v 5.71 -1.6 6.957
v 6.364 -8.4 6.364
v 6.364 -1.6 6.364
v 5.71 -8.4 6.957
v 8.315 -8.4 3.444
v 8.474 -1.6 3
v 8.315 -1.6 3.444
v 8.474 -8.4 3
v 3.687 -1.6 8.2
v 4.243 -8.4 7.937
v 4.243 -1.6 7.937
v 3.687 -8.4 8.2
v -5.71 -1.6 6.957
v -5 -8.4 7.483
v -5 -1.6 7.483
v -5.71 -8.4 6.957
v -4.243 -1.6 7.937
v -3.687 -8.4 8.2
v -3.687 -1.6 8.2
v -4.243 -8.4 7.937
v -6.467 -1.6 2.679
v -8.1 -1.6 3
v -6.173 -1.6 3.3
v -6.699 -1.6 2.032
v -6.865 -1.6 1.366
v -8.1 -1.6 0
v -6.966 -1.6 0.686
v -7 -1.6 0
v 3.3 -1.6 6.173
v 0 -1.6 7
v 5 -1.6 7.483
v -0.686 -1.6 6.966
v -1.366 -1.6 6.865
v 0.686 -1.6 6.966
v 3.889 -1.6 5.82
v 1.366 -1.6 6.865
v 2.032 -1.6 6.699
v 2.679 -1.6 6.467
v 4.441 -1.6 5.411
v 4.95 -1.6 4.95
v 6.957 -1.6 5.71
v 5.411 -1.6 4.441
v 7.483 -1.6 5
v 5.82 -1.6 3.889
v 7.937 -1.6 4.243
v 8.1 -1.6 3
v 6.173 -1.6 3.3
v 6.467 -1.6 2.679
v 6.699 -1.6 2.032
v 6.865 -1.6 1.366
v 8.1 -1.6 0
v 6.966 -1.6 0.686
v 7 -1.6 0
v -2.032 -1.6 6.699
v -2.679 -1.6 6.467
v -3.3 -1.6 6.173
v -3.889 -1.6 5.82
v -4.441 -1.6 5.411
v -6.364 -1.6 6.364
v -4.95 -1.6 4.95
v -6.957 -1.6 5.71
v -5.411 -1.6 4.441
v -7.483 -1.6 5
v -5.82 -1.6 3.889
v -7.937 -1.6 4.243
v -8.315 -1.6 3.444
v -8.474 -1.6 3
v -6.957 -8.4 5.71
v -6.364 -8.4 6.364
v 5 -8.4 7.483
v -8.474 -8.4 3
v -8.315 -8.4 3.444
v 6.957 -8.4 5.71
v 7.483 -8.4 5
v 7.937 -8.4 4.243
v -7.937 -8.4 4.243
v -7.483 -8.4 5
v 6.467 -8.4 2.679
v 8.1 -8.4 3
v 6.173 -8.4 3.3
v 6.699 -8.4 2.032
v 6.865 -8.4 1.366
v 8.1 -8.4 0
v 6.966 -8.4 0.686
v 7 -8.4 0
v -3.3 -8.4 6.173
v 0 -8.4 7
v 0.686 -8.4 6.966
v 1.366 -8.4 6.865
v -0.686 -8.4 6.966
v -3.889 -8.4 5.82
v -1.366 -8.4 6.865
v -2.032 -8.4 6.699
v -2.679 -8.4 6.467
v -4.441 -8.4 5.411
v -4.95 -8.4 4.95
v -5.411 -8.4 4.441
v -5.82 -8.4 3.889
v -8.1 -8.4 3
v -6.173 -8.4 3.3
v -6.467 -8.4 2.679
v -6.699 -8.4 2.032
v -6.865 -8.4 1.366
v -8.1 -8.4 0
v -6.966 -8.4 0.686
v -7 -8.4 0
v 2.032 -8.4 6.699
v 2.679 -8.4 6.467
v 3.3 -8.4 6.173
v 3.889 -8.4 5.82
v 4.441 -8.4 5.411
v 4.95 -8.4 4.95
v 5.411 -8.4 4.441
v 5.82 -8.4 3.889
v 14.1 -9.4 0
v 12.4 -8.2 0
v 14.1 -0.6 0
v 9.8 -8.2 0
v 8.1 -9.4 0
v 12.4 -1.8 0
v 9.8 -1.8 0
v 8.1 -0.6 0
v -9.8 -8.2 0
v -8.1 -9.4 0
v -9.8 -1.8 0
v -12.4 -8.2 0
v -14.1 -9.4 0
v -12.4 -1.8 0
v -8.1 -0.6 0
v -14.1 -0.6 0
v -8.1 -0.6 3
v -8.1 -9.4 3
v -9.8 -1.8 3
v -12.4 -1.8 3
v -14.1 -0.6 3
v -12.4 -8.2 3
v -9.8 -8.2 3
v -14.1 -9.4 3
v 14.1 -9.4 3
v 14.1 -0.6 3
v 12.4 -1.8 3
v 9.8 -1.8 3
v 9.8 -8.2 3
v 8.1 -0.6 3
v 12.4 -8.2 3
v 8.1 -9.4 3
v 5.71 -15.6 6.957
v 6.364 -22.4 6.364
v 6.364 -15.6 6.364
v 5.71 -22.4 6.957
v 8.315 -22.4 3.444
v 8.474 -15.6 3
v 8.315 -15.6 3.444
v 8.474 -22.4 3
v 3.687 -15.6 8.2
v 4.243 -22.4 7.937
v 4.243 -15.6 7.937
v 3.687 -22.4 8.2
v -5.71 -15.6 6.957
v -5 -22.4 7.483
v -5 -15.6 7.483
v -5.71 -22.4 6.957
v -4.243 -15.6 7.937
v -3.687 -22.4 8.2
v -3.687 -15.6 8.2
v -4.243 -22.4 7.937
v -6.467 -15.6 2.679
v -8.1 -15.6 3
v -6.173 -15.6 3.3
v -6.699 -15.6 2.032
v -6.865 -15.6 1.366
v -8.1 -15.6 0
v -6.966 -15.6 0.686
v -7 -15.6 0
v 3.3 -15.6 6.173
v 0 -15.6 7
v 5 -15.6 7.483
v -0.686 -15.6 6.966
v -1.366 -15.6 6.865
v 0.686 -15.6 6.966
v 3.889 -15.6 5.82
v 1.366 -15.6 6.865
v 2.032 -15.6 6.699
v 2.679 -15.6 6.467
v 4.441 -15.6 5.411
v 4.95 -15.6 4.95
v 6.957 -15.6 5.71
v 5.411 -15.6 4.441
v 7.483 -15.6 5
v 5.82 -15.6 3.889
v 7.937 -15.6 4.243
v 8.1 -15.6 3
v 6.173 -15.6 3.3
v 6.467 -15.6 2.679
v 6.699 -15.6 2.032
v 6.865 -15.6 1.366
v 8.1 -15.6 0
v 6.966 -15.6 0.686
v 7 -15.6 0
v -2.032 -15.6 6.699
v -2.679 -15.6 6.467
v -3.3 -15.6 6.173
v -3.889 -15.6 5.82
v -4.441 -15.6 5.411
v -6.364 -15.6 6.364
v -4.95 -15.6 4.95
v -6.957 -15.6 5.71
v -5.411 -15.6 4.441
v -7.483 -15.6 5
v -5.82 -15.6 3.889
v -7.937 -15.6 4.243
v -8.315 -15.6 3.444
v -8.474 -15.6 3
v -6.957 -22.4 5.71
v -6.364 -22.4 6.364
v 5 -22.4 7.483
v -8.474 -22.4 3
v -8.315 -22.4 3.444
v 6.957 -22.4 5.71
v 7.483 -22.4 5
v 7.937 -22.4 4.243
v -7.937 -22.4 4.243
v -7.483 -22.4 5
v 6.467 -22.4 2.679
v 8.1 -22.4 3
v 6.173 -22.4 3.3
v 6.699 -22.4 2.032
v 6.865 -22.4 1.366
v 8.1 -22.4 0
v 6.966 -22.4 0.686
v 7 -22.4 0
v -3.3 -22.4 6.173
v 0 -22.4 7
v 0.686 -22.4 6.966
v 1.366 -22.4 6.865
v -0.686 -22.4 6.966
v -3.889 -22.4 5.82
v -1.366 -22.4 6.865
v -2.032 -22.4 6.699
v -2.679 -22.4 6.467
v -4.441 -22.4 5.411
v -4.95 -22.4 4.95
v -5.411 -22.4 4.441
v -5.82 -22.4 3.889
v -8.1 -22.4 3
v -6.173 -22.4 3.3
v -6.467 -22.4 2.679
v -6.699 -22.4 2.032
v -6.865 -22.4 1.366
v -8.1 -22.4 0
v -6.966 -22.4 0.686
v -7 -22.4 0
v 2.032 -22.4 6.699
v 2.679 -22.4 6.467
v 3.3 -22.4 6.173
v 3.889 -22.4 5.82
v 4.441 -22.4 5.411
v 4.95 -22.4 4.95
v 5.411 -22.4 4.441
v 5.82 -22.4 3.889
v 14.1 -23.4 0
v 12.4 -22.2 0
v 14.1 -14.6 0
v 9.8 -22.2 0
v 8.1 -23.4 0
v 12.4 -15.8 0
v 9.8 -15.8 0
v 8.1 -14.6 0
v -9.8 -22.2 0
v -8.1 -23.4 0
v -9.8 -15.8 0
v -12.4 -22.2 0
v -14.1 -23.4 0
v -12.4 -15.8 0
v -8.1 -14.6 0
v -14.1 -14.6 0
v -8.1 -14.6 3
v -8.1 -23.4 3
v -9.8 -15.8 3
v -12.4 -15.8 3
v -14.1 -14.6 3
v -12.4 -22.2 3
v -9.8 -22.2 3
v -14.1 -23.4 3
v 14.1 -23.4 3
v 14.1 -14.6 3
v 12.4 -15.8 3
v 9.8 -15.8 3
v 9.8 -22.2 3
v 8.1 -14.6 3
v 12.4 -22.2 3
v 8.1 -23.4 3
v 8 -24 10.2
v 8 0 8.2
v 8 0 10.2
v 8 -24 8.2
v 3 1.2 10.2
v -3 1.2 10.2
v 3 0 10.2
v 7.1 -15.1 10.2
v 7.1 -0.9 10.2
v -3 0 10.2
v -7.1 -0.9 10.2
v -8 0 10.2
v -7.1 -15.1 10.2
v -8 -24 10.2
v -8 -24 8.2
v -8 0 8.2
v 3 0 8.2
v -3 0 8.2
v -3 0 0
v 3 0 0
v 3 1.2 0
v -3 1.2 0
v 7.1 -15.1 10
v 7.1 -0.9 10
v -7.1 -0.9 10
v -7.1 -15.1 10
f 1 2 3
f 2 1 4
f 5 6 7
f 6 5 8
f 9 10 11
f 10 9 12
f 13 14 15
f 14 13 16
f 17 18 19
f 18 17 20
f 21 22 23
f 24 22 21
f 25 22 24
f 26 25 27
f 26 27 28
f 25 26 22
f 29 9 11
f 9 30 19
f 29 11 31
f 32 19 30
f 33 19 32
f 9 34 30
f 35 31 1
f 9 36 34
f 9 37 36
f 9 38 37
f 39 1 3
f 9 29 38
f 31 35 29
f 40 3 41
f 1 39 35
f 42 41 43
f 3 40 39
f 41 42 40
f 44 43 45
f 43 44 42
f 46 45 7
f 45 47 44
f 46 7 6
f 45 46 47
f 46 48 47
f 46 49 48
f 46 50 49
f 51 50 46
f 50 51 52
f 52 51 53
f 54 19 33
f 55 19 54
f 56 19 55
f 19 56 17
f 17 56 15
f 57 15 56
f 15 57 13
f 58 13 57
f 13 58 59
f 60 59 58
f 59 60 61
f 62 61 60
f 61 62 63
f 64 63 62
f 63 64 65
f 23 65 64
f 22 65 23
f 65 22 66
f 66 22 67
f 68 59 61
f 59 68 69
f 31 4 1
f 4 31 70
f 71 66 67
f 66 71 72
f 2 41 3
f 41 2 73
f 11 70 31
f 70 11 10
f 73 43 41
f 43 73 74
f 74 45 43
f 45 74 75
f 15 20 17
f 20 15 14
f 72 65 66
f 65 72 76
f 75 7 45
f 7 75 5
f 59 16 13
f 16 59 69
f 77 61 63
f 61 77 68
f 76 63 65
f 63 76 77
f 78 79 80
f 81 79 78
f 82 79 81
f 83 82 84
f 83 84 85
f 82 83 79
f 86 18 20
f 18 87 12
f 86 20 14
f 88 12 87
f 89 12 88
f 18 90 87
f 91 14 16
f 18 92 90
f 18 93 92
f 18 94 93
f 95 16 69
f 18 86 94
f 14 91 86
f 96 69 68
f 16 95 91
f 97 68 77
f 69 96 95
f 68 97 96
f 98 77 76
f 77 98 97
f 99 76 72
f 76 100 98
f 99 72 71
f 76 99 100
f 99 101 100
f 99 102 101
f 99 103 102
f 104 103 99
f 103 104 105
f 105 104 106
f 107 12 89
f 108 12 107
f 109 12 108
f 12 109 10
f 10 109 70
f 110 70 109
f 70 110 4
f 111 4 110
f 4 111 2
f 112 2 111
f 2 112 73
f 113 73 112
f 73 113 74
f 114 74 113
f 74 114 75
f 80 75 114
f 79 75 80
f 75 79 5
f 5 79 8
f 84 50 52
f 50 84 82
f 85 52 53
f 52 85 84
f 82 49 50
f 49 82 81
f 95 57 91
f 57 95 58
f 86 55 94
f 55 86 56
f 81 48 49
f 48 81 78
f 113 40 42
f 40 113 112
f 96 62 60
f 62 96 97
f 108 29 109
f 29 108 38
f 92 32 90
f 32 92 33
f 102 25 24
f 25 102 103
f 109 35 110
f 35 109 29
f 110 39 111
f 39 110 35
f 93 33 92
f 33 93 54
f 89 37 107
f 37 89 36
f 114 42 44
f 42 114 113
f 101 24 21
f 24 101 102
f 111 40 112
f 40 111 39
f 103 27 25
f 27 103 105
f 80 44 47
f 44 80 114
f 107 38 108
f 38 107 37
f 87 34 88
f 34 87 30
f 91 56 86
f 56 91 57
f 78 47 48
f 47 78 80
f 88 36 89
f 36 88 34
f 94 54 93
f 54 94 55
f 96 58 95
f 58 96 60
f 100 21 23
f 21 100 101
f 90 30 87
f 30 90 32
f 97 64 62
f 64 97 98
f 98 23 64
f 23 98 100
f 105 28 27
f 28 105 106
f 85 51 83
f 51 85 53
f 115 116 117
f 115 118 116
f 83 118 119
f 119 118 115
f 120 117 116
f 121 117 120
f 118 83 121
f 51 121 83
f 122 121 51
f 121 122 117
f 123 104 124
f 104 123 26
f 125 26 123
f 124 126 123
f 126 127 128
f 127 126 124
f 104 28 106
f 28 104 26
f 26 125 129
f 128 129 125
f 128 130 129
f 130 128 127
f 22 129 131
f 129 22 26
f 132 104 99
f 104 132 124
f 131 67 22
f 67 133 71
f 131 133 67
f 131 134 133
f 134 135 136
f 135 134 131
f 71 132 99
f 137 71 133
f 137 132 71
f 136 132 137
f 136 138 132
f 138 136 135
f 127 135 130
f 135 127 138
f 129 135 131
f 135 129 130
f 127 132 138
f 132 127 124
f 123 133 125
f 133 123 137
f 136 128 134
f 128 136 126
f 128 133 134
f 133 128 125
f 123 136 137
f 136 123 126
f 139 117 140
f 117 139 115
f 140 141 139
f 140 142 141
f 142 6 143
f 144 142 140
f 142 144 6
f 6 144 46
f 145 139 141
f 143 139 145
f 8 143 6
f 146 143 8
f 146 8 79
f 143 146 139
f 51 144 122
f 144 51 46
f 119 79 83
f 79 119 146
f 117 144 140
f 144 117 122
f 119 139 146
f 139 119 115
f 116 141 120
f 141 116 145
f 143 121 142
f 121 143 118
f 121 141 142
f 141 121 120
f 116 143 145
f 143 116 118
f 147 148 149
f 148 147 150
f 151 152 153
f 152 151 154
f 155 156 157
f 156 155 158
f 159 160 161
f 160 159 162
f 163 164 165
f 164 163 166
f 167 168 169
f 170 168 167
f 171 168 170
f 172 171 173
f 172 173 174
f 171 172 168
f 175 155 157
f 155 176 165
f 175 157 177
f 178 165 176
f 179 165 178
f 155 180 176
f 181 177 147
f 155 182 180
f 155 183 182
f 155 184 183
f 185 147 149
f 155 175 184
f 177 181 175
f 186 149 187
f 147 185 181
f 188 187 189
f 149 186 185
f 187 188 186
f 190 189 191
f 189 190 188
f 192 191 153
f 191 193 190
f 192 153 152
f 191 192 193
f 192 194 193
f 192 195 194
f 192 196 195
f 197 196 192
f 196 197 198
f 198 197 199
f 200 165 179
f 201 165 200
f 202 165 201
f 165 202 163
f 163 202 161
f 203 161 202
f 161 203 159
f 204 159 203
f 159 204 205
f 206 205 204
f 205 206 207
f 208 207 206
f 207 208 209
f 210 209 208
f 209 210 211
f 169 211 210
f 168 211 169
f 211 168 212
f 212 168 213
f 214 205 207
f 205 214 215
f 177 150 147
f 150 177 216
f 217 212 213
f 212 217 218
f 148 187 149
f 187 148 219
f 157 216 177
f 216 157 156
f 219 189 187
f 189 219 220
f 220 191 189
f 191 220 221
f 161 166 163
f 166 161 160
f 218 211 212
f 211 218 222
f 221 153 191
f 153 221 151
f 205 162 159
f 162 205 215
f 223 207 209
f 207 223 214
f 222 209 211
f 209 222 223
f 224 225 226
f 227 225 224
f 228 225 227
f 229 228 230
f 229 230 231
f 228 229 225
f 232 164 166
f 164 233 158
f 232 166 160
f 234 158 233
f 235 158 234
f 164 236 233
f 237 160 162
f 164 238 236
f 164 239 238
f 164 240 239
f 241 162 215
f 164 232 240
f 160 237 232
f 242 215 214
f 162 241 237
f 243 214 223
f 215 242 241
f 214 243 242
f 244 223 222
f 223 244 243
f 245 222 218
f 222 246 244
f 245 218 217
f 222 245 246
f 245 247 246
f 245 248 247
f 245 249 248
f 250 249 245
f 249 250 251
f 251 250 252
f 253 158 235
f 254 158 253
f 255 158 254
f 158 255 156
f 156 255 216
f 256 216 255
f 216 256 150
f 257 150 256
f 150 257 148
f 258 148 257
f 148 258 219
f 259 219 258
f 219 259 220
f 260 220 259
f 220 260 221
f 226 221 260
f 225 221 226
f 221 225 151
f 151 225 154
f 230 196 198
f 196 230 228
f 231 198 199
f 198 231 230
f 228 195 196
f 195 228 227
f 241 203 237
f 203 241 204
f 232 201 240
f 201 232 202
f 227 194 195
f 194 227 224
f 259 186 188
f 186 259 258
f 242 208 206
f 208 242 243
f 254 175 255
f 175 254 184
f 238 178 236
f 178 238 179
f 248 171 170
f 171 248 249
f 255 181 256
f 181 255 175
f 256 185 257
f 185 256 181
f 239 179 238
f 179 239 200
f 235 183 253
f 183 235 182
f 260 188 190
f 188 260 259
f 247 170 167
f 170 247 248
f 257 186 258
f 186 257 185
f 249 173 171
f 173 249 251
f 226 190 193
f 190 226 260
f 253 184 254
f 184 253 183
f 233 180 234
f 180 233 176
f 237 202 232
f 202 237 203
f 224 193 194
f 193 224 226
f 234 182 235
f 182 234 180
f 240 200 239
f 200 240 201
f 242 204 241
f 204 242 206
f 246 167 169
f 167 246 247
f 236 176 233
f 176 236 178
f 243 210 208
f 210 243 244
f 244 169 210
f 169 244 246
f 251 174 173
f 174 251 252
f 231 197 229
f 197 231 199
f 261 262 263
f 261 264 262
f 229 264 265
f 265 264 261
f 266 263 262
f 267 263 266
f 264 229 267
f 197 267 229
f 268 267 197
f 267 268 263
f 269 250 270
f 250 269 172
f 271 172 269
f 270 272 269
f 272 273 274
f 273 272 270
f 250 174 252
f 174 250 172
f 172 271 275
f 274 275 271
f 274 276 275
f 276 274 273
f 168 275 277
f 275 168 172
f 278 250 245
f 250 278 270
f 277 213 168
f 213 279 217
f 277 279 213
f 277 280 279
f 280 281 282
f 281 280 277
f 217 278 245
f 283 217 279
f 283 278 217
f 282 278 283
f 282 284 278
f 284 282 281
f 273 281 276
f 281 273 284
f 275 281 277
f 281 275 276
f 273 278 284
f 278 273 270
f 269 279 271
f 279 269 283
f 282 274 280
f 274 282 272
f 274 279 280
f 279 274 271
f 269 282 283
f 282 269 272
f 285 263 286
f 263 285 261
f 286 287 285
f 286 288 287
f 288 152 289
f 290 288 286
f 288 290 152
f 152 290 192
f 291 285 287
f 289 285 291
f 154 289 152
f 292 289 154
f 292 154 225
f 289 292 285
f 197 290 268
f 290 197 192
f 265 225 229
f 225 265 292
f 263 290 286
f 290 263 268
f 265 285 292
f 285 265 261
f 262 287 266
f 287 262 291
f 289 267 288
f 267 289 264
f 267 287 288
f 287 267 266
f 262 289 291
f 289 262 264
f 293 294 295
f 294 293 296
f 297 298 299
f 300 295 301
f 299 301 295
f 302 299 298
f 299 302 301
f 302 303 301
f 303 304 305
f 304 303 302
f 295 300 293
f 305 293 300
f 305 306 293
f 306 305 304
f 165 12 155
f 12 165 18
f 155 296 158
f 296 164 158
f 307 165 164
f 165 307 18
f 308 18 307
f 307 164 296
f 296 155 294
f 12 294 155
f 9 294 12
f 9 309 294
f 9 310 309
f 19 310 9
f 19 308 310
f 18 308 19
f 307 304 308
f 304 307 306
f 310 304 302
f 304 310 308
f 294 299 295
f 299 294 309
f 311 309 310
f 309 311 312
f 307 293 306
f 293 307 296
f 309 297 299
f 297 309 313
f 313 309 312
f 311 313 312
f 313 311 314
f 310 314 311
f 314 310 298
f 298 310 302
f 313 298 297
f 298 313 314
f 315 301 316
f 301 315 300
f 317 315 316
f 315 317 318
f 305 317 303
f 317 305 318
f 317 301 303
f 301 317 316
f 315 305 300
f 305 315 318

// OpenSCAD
// ReachSense six-finger wrap v1. Units: mm. Experimental, physically unverified.
// R: +X lateral, +Y distal (towards fingertip), +Z dorsal.
// The marker deck's distal edge and the stop's inner contact face are both Y=0.
// The outer stop is Y=1.2; it is NOT the anatomical reference.
// The stop constrains Y only. Anatomical X/Z and placement repeatability are unverified.
$fn = 64;
part = "holder"; // "holder" or "strap"
marker_id = 23;
finger_diameter_mm = 14;
marker_edge_mm = 10;
quiet_zone_mm = 2;
frame_mm = 1;
wall_mm = 2;
stop_wall_mm = 1.2;
strap_width_mm = 6;
strap_length_mm = 90;

r = finger_diameter_mm/2;
tile = marker_edge_mm + 2*quiet_zone_mm;
deck_width = tile + 2*frame_mm;
length = tile + 2*frame_mm + 8;
deck_bottom = r + wall_mm - 0.8;
deck_top = deck_bottom + 2;
pocket_depth = 0.2;
marker_y = -(frame_mm + quiet_zone_mm + marker_edge_mm/2);
support_y = [-5, -length+5];

assert(finger_diameter_mm >= 12 && finger_diameter_mm <= 26, "Choose a 12–26 mm candidate opening");
assert(marker_edge_mm >= 8 && marker_edge_mm <= 16, "Choose an 8–16 mm black edge");
assert(quiet_zone_mm >= 2, "Keep the full white quiet zone");
assert(marker_id >= 0 && marker_id < 100, "DICT_4X4_100 ID required");

module support(y) {
    translate([0,y,0]) intersection() {
        difference() {
            rotate([90,0,0]) cylinder(r=r+wall_mm,h=6.8,center=true);
            rotate([90,0,0]) cylinder(r=r,h=8.8,center=true);
        }
        translate([-r-wall_mm-1,-4.4,0]) cube([2*(r+wall_mm+1),8.8,r+wall_mm+1]);
    }
    // Through-slots for 6 mm hook-and-loop strap or the optional TPU strip.
    for(sign=[-1,1]) translate([sign*(r+wall_mm+2.1),y,1.5]) difference() {
        cube([6,8.8,3],center=true);
        cube([2.6,6.4,5],center=true);
    }
}

module holder() {
    difference() {
        union() {
            for(y=support_y) support(y);
            translate([-deck_width/2,-length,deck_bottom]) cube([deck_width,length,2]);
            // Front stop contacts the fingertip at its INNER face Y=0.
            // Deck ends at Y=0 while this wall extends beyond it, preserving the reference.
            translate([-3,0,0]) cube([6,stop_wall_mm,deck_top]);
        }
        // Shallow square registration recess. Keep all 2 mm white margins visible.
        translate([-tile/2-0.1,marker_y-tile/2-0.1,deck_top-pocket_depth])
            cube([tile+0.2,tile+0.2,pocket_depth+1]);
        // Identity comes from the attached printed marker. Geometry is shared by size.
    }
}

module strap() {
    // TPU-only ladder strip. Its ends need a return loop/fastener or hook-and-loop tape.
    // This is not an articulated hard-plastic chain or a validated locking buckle.
    union() {
        translate([-strap_length_mm/2,-strap_width_mm/2,0])
            cube([strap_length_mm,strap_width_mm,0.8]);
        for(x=[-strap_length_mm/2+3:4:strap_length_mm/2-3])
            translate([x-0.7,-strap_width_mm/2,0.8]) cube([1.4,strap_width_mm,0.5]);
    }
}

if(part == "strap") strap(); else holder();
echo(reference_plane_y_mm=0, outer_stop_y_mm=stop_wall_mm);
echo(marker_center_R_mm=[0,marker_y,deck_top-pocket_depth+0.15]);
echo(marker_center_to_distal_deck_edge_mm=-marker_y);
